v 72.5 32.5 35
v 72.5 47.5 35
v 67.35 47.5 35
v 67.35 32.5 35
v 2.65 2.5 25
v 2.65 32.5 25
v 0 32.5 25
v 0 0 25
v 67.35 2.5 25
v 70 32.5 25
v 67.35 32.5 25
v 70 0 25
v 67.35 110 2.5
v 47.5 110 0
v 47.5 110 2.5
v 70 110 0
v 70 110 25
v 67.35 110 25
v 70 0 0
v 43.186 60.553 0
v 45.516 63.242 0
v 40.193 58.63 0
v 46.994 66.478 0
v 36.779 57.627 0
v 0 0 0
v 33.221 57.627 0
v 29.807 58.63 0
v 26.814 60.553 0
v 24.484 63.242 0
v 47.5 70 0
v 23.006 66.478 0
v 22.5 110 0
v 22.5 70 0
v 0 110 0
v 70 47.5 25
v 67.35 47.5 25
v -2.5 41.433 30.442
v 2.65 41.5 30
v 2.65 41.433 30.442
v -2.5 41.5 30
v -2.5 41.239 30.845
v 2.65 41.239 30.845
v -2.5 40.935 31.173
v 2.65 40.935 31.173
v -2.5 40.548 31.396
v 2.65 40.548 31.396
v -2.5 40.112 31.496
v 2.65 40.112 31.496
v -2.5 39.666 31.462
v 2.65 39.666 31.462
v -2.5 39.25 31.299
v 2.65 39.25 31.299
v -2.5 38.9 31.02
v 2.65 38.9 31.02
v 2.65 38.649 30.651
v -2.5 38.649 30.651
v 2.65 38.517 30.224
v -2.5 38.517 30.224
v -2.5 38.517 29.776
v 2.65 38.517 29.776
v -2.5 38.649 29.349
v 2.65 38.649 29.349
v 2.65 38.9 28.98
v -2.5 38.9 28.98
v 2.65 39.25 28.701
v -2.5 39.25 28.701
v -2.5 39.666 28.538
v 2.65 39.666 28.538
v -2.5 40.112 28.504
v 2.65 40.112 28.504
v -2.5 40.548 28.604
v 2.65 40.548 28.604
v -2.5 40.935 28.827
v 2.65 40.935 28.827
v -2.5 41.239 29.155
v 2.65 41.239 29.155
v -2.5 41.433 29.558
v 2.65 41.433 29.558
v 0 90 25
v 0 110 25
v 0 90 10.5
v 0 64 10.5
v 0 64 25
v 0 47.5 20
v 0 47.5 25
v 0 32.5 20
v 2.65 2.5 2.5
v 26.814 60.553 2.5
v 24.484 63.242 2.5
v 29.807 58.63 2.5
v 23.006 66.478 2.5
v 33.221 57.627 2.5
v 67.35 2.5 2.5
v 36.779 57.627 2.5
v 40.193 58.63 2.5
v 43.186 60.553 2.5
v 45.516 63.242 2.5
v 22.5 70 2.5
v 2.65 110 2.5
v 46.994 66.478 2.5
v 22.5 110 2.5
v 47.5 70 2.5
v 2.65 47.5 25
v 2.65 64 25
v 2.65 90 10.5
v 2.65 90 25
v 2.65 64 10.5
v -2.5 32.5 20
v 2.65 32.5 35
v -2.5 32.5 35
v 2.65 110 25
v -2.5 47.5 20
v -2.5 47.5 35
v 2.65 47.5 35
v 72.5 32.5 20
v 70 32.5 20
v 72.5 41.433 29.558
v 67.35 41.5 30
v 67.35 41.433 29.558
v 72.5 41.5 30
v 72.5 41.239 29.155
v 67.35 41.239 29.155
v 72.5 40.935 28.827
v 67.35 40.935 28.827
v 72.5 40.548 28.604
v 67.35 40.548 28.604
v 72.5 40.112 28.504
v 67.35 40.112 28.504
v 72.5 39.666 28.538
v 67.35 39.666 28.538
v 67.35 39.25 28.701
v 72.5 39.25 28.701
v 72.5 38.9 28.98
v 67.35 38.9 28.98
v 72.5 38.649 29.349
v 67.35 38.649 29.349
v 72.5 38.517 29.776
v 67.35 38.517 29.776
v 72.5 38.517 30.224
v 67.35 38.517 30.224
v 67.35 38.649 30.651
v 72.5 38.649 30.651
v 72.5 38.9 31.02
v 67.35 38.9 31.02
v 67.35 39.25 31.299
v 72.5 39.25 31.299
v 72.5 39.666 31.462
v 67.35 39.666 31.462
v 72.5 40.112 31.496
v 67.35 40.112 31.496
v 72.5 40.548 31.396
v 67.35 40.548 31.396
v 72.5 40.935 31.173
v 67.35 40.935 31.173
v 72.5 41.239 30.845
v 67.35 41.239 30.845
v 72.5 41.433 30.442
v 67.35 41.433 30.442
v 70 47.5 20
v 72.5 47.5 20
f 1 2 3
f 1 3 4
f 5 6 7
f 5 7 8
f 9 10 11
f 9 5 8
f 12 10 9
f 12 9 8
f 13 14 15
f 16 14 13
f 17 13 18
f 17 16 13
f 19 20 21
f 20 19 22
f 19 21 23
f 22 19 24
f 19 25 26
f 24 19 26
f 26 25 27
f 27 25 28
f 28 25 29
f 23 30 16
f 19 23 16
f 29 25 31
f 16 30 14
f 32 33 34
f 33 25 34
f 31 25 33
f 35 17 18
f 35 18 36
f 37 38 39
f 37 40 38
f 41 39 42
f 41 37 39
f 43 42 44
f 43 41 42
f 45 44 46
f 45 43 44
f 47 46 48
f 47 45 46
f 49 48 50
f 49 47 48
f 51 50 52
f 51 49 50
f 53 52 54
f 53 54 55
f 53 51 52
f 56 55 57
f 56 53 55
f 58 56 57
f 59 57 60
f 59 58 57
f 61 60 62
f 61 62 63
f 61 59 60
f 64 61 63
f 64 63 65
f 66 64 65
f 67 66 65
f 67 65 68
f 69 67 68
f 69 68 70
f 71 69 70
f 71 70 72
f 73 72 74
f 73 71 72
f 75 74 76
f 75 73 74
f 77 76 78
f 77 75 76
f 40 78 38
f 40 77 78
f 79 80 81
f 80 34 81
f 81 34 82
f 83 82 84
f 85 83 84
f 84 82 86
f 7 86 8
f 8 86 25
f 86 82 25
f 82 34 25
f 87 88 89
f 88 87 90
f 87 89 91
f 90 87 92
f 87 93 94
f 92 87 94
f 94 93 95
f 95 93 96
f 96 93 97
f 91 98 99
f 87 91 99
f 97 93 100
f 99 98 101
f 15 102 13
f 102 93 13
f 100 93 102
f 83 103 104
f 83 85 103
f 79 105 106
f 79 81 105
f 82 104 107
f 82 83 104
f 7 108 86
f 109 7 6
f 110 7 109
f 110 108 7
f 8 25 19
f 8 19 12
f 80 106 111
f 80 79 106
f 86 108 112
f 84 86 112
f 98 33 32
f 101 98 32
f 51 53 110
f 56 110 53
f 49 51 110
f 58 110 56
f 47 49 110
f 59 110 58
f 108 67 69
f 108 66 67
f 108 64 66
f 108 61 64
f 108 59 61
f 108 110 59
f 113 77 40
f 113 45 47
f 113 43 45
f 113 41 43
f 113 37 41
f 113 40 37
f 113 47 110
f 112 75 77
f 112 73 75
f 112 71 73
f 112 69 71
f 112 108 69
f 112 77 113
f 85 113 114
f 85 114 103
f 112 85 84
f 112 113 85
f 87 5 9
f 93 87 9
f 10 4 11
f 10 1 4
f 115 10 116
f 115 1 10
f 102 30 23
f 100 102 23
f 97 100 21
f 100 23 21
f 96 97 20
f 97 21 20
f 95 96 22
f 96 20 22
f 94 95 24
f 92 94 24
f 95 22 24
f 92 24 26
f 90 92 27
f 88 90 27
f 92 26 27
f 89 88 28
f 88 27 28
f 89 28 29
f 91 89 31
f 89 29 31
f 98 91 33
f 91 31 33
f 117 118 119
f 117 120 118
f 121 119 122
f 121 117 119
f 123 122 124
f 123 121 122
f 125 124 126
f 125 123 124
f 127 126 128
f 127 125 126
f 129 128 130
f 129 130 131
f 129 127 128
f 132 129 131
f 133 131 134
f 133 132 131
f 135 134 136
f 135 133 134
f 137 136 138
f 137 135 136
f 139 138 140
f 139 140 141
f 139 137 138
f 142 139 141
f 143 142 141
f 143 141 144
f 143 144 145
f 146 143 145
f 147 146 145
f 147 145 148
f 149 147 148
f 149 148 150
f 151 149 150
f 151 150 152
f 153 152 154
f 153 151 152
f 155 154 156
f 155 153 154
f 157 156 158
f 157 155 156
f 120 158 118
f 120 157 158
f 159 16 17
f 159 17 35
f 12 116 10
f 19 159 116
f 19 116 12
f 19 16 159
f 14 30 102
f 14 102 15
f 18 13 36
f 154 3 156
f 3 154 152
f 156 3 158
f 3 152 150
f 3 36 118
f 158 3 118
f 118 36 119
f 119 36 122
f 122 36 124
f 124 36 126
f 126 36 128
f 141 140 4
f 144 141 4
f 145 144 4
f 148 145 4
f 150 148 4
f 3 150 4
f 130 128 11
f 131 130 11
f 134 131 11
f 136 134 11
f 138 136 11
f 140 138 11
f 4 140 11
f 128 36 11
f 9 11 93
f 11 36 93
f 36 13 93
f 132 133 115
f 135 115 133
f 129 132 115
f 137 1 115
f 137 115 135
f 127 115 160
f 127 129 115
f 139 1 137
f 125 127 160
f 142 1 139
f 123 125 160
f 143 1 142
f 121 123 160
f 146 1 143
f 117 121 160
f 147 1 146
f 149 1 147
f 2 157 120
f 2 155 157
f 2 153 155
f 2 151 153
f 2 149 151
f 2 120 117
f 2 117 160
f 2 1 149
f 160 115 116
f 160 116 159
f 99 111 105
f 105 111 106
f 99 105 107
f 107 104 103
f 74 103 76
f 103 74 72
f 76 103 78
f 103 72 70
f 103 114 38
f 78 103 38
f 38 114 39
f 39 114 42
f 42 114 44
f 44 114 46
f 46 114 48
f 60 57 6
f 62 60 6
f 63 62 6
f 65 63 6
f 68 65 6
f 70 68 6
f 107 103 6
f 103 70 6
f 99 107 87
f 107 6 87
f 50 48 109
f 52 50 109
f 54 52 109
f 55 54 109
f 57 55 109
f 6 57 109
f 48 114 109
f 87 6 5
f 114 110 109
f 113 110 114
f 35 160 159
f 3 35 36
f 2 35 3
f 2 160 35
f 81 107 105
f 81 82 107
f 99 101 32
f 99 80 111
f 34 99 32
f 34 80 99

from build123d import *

# Parameters (mm, degrees)
SKETCH_W        = 110
SKETCH_H        = 25
PAD_DEPTH       = 70
POCKET_DEPTH    = 22.5
SKETCH002_W     = 20
SKETCH002_H     = 22.5
POCKET001_DEPTH = 70.001
SKETCH003_W     = 15
SKETCH003_H     = 15
SKETCH003_R     = 1.5
PAD001_DEPTH    = 2.5
SKETCH004_W     = 15
SKETCH004_H     = 15
SKETCH004_R     = 1.5
PAD002_DEPTH    = 2.5
POCKET002_DEPTH = 2.5
SKETCH006_W     = 26
SKETCH006_H     = 14.5
POCKET003_DEPTH = 2.5
SKETCH007_W     = 20
SKETCH007_H     = 2.5
PAD003_DEPTH    = 22.5
SKETCH008_W     = 20
SKETCH008_H     = 2.5
PAD004_DEPTH    = 22.5
SKETCH009_R     = 1.5
PAD005_DEPTH    = 0.15
SKETCH010_R     = 1.5
PAD006_DEPTH    = 0.15


with BuildPart() as part:
    # Sketch → Pad (new body)
    with BuildSketch(Plane.YZ):
        with Locations((55, 12.5)):
            Rectangle(SKETCH_W, SKETCH_H)
    extrude(amount=PAD_DEPTH)

    # Sketch001 (on Face3 of Pad) → Pocket (cut)
    with BuildSketch(Plane(origin=(0, 0, 25), x_dir=(0, -1, 0), z_dir=(0, 0, 1))):
        Polygon((-107.5, 2.5), (-2.5, 2.5), (-2.5, 67.5), (-107.5, 67.5), (-110, 67.5), (-110, 2.5), align=None)
    extrude(amount=-POCKET_DEPTH, mode=Mode.SUBTRACT)

    # Sketch002 (on Face5 of Pocket) → Pocket001 (cut, through all)
    with BuildSketch(Plane.YZ.offset(70)):
        with Locations((100, 13.75)):
            Rectangle(SKETCH002_W, SKETCH002_H)
    extrude(amount=-POCKET001_DEPTH, mode=Mode.SUBTRACT)

    # Sketch003 (on Face5 of Pocket001) → Pad001 (join, symmetric)
    with BuildSketch(Plane.YZ.offset(70)):
        with Locations((40, 27.5)):
            Rectangle(SKETCH003_W, SKETCH003_H)
        with Locations((40, 30)):
            Circle(SKETCH003_R, mode=Mode.SUBTRACT)
    extrude(amount=PAD001_DEPTH, both=True)

    # Sketch004 (on Face4 of Pad001) → Pad002 (join, symmetric)
    with BuildSketch(Plane(origin=(0, 0, 0), x_dir=(0, 1, 0), z_dir=(-1, 0, 0))):
        with Locations((40, -27.5)):
            Rectangle(SKETCH004_W, SKETCH004_H)
        with Locations((40, -30)):
            Circle(SKETCH004_R, mode=Mode.SUBTRACT)
    extrude(amount=PAD002_DEPTH, both=True)

    # Sketch005 → Pocket002 (cut)
    with BuildSketch(Plane.YX):
        with BuildLine():
            ThreePointArc((70, 47.5), (57.5, 35), (70, 22.5))
            Line((70, 22.5), (110, 22.5))
            ThreePointArc((110, 22.5), (122.5, 35), (110, 47.5))
            Line((70, 47.5), (110, 47.5))
        make_face()
    extrude(amount=-POCKET002_DEPTH, mode=Mode.SUBTRACT)

    # Sketch006 (on Face2 of Pocket002) → Pocket003 (cut)
    with BuildSketch(Plane(origin=(0, 0, 0), x_dir=(0, 1, 0), z_dir=(-1, 0, 0))):
        with Locations((77, -17.75)):
            Rectangle(SKETCH006_W, SKETCH006_H)
    extrude(amount=-POCKET003_DEPTH, mode=Mode.SUBTRACT)

    # Sketch007 (on Face17 of Pocket003) → Pad003 (join)
    with BuildSketch(Plane(origin=(0, 0, 2.5), x_dir=(0, -1, 0), z_dir=(0, 0, 1))):
        with Locations((-100, 1.25)):
            Rectangle(SKETCH007_W, SKETCH007_H)
    extrude(amount=PAD003_DEPTH)

    # Sketch008 (on Face15 of Pad003) → Pad004 (join)
    with BuildSketch(Plane(origin=(0, 0, 2.5), x_dir=(0, -1, 0), z_dir=(0, 0, 1))):
        with Locations((-100, 68.75)):
            Rectangle(SKETCH008_W, SKETCH008_H)
    extrude(amount=PAD004_DEPTH)

    # Sketch009 (on Face17 of Pad004) → Pad005 (join)
    with BuildSketch(Plane.YZ.offset(2.5)):
        Polygon((110, 25), (110, 2.5), (2.5, 2.5), (2.5, 25), (32.5, 25), (32.5, 35), (47.5, 35), (47.5, 25), (64, 25), (64, 10.5), (90, 10.5), (90, 25), align=None)
        with Locations((40, 30)):
            Circle(SKETCH009_R, mode=Mode.SUBTRACT)
    extrude(amount=PAD005_DEPTH)

    # Sketch010 (on Face11 of Pad005) → Pad006 (join)
    with BuildSketch(Plane(origin=(67.5, 0, 0), x_dir=(0, 1, 0), z_dir=(-1, 0, 0))):
        Polygon((2.5, -2.5), (110, -2.5), (110, -25), (47.5, -25), (47.5, -35), (32.5, -35), (32.5, -25), (2.5, -25), align=None)
        with Locations((40, -30)):
            Circle(SKETCH010_R, mode=Mode.SUBTRACT)
    extrude(amount=PAD006_DEPTH)


solid = part.part
